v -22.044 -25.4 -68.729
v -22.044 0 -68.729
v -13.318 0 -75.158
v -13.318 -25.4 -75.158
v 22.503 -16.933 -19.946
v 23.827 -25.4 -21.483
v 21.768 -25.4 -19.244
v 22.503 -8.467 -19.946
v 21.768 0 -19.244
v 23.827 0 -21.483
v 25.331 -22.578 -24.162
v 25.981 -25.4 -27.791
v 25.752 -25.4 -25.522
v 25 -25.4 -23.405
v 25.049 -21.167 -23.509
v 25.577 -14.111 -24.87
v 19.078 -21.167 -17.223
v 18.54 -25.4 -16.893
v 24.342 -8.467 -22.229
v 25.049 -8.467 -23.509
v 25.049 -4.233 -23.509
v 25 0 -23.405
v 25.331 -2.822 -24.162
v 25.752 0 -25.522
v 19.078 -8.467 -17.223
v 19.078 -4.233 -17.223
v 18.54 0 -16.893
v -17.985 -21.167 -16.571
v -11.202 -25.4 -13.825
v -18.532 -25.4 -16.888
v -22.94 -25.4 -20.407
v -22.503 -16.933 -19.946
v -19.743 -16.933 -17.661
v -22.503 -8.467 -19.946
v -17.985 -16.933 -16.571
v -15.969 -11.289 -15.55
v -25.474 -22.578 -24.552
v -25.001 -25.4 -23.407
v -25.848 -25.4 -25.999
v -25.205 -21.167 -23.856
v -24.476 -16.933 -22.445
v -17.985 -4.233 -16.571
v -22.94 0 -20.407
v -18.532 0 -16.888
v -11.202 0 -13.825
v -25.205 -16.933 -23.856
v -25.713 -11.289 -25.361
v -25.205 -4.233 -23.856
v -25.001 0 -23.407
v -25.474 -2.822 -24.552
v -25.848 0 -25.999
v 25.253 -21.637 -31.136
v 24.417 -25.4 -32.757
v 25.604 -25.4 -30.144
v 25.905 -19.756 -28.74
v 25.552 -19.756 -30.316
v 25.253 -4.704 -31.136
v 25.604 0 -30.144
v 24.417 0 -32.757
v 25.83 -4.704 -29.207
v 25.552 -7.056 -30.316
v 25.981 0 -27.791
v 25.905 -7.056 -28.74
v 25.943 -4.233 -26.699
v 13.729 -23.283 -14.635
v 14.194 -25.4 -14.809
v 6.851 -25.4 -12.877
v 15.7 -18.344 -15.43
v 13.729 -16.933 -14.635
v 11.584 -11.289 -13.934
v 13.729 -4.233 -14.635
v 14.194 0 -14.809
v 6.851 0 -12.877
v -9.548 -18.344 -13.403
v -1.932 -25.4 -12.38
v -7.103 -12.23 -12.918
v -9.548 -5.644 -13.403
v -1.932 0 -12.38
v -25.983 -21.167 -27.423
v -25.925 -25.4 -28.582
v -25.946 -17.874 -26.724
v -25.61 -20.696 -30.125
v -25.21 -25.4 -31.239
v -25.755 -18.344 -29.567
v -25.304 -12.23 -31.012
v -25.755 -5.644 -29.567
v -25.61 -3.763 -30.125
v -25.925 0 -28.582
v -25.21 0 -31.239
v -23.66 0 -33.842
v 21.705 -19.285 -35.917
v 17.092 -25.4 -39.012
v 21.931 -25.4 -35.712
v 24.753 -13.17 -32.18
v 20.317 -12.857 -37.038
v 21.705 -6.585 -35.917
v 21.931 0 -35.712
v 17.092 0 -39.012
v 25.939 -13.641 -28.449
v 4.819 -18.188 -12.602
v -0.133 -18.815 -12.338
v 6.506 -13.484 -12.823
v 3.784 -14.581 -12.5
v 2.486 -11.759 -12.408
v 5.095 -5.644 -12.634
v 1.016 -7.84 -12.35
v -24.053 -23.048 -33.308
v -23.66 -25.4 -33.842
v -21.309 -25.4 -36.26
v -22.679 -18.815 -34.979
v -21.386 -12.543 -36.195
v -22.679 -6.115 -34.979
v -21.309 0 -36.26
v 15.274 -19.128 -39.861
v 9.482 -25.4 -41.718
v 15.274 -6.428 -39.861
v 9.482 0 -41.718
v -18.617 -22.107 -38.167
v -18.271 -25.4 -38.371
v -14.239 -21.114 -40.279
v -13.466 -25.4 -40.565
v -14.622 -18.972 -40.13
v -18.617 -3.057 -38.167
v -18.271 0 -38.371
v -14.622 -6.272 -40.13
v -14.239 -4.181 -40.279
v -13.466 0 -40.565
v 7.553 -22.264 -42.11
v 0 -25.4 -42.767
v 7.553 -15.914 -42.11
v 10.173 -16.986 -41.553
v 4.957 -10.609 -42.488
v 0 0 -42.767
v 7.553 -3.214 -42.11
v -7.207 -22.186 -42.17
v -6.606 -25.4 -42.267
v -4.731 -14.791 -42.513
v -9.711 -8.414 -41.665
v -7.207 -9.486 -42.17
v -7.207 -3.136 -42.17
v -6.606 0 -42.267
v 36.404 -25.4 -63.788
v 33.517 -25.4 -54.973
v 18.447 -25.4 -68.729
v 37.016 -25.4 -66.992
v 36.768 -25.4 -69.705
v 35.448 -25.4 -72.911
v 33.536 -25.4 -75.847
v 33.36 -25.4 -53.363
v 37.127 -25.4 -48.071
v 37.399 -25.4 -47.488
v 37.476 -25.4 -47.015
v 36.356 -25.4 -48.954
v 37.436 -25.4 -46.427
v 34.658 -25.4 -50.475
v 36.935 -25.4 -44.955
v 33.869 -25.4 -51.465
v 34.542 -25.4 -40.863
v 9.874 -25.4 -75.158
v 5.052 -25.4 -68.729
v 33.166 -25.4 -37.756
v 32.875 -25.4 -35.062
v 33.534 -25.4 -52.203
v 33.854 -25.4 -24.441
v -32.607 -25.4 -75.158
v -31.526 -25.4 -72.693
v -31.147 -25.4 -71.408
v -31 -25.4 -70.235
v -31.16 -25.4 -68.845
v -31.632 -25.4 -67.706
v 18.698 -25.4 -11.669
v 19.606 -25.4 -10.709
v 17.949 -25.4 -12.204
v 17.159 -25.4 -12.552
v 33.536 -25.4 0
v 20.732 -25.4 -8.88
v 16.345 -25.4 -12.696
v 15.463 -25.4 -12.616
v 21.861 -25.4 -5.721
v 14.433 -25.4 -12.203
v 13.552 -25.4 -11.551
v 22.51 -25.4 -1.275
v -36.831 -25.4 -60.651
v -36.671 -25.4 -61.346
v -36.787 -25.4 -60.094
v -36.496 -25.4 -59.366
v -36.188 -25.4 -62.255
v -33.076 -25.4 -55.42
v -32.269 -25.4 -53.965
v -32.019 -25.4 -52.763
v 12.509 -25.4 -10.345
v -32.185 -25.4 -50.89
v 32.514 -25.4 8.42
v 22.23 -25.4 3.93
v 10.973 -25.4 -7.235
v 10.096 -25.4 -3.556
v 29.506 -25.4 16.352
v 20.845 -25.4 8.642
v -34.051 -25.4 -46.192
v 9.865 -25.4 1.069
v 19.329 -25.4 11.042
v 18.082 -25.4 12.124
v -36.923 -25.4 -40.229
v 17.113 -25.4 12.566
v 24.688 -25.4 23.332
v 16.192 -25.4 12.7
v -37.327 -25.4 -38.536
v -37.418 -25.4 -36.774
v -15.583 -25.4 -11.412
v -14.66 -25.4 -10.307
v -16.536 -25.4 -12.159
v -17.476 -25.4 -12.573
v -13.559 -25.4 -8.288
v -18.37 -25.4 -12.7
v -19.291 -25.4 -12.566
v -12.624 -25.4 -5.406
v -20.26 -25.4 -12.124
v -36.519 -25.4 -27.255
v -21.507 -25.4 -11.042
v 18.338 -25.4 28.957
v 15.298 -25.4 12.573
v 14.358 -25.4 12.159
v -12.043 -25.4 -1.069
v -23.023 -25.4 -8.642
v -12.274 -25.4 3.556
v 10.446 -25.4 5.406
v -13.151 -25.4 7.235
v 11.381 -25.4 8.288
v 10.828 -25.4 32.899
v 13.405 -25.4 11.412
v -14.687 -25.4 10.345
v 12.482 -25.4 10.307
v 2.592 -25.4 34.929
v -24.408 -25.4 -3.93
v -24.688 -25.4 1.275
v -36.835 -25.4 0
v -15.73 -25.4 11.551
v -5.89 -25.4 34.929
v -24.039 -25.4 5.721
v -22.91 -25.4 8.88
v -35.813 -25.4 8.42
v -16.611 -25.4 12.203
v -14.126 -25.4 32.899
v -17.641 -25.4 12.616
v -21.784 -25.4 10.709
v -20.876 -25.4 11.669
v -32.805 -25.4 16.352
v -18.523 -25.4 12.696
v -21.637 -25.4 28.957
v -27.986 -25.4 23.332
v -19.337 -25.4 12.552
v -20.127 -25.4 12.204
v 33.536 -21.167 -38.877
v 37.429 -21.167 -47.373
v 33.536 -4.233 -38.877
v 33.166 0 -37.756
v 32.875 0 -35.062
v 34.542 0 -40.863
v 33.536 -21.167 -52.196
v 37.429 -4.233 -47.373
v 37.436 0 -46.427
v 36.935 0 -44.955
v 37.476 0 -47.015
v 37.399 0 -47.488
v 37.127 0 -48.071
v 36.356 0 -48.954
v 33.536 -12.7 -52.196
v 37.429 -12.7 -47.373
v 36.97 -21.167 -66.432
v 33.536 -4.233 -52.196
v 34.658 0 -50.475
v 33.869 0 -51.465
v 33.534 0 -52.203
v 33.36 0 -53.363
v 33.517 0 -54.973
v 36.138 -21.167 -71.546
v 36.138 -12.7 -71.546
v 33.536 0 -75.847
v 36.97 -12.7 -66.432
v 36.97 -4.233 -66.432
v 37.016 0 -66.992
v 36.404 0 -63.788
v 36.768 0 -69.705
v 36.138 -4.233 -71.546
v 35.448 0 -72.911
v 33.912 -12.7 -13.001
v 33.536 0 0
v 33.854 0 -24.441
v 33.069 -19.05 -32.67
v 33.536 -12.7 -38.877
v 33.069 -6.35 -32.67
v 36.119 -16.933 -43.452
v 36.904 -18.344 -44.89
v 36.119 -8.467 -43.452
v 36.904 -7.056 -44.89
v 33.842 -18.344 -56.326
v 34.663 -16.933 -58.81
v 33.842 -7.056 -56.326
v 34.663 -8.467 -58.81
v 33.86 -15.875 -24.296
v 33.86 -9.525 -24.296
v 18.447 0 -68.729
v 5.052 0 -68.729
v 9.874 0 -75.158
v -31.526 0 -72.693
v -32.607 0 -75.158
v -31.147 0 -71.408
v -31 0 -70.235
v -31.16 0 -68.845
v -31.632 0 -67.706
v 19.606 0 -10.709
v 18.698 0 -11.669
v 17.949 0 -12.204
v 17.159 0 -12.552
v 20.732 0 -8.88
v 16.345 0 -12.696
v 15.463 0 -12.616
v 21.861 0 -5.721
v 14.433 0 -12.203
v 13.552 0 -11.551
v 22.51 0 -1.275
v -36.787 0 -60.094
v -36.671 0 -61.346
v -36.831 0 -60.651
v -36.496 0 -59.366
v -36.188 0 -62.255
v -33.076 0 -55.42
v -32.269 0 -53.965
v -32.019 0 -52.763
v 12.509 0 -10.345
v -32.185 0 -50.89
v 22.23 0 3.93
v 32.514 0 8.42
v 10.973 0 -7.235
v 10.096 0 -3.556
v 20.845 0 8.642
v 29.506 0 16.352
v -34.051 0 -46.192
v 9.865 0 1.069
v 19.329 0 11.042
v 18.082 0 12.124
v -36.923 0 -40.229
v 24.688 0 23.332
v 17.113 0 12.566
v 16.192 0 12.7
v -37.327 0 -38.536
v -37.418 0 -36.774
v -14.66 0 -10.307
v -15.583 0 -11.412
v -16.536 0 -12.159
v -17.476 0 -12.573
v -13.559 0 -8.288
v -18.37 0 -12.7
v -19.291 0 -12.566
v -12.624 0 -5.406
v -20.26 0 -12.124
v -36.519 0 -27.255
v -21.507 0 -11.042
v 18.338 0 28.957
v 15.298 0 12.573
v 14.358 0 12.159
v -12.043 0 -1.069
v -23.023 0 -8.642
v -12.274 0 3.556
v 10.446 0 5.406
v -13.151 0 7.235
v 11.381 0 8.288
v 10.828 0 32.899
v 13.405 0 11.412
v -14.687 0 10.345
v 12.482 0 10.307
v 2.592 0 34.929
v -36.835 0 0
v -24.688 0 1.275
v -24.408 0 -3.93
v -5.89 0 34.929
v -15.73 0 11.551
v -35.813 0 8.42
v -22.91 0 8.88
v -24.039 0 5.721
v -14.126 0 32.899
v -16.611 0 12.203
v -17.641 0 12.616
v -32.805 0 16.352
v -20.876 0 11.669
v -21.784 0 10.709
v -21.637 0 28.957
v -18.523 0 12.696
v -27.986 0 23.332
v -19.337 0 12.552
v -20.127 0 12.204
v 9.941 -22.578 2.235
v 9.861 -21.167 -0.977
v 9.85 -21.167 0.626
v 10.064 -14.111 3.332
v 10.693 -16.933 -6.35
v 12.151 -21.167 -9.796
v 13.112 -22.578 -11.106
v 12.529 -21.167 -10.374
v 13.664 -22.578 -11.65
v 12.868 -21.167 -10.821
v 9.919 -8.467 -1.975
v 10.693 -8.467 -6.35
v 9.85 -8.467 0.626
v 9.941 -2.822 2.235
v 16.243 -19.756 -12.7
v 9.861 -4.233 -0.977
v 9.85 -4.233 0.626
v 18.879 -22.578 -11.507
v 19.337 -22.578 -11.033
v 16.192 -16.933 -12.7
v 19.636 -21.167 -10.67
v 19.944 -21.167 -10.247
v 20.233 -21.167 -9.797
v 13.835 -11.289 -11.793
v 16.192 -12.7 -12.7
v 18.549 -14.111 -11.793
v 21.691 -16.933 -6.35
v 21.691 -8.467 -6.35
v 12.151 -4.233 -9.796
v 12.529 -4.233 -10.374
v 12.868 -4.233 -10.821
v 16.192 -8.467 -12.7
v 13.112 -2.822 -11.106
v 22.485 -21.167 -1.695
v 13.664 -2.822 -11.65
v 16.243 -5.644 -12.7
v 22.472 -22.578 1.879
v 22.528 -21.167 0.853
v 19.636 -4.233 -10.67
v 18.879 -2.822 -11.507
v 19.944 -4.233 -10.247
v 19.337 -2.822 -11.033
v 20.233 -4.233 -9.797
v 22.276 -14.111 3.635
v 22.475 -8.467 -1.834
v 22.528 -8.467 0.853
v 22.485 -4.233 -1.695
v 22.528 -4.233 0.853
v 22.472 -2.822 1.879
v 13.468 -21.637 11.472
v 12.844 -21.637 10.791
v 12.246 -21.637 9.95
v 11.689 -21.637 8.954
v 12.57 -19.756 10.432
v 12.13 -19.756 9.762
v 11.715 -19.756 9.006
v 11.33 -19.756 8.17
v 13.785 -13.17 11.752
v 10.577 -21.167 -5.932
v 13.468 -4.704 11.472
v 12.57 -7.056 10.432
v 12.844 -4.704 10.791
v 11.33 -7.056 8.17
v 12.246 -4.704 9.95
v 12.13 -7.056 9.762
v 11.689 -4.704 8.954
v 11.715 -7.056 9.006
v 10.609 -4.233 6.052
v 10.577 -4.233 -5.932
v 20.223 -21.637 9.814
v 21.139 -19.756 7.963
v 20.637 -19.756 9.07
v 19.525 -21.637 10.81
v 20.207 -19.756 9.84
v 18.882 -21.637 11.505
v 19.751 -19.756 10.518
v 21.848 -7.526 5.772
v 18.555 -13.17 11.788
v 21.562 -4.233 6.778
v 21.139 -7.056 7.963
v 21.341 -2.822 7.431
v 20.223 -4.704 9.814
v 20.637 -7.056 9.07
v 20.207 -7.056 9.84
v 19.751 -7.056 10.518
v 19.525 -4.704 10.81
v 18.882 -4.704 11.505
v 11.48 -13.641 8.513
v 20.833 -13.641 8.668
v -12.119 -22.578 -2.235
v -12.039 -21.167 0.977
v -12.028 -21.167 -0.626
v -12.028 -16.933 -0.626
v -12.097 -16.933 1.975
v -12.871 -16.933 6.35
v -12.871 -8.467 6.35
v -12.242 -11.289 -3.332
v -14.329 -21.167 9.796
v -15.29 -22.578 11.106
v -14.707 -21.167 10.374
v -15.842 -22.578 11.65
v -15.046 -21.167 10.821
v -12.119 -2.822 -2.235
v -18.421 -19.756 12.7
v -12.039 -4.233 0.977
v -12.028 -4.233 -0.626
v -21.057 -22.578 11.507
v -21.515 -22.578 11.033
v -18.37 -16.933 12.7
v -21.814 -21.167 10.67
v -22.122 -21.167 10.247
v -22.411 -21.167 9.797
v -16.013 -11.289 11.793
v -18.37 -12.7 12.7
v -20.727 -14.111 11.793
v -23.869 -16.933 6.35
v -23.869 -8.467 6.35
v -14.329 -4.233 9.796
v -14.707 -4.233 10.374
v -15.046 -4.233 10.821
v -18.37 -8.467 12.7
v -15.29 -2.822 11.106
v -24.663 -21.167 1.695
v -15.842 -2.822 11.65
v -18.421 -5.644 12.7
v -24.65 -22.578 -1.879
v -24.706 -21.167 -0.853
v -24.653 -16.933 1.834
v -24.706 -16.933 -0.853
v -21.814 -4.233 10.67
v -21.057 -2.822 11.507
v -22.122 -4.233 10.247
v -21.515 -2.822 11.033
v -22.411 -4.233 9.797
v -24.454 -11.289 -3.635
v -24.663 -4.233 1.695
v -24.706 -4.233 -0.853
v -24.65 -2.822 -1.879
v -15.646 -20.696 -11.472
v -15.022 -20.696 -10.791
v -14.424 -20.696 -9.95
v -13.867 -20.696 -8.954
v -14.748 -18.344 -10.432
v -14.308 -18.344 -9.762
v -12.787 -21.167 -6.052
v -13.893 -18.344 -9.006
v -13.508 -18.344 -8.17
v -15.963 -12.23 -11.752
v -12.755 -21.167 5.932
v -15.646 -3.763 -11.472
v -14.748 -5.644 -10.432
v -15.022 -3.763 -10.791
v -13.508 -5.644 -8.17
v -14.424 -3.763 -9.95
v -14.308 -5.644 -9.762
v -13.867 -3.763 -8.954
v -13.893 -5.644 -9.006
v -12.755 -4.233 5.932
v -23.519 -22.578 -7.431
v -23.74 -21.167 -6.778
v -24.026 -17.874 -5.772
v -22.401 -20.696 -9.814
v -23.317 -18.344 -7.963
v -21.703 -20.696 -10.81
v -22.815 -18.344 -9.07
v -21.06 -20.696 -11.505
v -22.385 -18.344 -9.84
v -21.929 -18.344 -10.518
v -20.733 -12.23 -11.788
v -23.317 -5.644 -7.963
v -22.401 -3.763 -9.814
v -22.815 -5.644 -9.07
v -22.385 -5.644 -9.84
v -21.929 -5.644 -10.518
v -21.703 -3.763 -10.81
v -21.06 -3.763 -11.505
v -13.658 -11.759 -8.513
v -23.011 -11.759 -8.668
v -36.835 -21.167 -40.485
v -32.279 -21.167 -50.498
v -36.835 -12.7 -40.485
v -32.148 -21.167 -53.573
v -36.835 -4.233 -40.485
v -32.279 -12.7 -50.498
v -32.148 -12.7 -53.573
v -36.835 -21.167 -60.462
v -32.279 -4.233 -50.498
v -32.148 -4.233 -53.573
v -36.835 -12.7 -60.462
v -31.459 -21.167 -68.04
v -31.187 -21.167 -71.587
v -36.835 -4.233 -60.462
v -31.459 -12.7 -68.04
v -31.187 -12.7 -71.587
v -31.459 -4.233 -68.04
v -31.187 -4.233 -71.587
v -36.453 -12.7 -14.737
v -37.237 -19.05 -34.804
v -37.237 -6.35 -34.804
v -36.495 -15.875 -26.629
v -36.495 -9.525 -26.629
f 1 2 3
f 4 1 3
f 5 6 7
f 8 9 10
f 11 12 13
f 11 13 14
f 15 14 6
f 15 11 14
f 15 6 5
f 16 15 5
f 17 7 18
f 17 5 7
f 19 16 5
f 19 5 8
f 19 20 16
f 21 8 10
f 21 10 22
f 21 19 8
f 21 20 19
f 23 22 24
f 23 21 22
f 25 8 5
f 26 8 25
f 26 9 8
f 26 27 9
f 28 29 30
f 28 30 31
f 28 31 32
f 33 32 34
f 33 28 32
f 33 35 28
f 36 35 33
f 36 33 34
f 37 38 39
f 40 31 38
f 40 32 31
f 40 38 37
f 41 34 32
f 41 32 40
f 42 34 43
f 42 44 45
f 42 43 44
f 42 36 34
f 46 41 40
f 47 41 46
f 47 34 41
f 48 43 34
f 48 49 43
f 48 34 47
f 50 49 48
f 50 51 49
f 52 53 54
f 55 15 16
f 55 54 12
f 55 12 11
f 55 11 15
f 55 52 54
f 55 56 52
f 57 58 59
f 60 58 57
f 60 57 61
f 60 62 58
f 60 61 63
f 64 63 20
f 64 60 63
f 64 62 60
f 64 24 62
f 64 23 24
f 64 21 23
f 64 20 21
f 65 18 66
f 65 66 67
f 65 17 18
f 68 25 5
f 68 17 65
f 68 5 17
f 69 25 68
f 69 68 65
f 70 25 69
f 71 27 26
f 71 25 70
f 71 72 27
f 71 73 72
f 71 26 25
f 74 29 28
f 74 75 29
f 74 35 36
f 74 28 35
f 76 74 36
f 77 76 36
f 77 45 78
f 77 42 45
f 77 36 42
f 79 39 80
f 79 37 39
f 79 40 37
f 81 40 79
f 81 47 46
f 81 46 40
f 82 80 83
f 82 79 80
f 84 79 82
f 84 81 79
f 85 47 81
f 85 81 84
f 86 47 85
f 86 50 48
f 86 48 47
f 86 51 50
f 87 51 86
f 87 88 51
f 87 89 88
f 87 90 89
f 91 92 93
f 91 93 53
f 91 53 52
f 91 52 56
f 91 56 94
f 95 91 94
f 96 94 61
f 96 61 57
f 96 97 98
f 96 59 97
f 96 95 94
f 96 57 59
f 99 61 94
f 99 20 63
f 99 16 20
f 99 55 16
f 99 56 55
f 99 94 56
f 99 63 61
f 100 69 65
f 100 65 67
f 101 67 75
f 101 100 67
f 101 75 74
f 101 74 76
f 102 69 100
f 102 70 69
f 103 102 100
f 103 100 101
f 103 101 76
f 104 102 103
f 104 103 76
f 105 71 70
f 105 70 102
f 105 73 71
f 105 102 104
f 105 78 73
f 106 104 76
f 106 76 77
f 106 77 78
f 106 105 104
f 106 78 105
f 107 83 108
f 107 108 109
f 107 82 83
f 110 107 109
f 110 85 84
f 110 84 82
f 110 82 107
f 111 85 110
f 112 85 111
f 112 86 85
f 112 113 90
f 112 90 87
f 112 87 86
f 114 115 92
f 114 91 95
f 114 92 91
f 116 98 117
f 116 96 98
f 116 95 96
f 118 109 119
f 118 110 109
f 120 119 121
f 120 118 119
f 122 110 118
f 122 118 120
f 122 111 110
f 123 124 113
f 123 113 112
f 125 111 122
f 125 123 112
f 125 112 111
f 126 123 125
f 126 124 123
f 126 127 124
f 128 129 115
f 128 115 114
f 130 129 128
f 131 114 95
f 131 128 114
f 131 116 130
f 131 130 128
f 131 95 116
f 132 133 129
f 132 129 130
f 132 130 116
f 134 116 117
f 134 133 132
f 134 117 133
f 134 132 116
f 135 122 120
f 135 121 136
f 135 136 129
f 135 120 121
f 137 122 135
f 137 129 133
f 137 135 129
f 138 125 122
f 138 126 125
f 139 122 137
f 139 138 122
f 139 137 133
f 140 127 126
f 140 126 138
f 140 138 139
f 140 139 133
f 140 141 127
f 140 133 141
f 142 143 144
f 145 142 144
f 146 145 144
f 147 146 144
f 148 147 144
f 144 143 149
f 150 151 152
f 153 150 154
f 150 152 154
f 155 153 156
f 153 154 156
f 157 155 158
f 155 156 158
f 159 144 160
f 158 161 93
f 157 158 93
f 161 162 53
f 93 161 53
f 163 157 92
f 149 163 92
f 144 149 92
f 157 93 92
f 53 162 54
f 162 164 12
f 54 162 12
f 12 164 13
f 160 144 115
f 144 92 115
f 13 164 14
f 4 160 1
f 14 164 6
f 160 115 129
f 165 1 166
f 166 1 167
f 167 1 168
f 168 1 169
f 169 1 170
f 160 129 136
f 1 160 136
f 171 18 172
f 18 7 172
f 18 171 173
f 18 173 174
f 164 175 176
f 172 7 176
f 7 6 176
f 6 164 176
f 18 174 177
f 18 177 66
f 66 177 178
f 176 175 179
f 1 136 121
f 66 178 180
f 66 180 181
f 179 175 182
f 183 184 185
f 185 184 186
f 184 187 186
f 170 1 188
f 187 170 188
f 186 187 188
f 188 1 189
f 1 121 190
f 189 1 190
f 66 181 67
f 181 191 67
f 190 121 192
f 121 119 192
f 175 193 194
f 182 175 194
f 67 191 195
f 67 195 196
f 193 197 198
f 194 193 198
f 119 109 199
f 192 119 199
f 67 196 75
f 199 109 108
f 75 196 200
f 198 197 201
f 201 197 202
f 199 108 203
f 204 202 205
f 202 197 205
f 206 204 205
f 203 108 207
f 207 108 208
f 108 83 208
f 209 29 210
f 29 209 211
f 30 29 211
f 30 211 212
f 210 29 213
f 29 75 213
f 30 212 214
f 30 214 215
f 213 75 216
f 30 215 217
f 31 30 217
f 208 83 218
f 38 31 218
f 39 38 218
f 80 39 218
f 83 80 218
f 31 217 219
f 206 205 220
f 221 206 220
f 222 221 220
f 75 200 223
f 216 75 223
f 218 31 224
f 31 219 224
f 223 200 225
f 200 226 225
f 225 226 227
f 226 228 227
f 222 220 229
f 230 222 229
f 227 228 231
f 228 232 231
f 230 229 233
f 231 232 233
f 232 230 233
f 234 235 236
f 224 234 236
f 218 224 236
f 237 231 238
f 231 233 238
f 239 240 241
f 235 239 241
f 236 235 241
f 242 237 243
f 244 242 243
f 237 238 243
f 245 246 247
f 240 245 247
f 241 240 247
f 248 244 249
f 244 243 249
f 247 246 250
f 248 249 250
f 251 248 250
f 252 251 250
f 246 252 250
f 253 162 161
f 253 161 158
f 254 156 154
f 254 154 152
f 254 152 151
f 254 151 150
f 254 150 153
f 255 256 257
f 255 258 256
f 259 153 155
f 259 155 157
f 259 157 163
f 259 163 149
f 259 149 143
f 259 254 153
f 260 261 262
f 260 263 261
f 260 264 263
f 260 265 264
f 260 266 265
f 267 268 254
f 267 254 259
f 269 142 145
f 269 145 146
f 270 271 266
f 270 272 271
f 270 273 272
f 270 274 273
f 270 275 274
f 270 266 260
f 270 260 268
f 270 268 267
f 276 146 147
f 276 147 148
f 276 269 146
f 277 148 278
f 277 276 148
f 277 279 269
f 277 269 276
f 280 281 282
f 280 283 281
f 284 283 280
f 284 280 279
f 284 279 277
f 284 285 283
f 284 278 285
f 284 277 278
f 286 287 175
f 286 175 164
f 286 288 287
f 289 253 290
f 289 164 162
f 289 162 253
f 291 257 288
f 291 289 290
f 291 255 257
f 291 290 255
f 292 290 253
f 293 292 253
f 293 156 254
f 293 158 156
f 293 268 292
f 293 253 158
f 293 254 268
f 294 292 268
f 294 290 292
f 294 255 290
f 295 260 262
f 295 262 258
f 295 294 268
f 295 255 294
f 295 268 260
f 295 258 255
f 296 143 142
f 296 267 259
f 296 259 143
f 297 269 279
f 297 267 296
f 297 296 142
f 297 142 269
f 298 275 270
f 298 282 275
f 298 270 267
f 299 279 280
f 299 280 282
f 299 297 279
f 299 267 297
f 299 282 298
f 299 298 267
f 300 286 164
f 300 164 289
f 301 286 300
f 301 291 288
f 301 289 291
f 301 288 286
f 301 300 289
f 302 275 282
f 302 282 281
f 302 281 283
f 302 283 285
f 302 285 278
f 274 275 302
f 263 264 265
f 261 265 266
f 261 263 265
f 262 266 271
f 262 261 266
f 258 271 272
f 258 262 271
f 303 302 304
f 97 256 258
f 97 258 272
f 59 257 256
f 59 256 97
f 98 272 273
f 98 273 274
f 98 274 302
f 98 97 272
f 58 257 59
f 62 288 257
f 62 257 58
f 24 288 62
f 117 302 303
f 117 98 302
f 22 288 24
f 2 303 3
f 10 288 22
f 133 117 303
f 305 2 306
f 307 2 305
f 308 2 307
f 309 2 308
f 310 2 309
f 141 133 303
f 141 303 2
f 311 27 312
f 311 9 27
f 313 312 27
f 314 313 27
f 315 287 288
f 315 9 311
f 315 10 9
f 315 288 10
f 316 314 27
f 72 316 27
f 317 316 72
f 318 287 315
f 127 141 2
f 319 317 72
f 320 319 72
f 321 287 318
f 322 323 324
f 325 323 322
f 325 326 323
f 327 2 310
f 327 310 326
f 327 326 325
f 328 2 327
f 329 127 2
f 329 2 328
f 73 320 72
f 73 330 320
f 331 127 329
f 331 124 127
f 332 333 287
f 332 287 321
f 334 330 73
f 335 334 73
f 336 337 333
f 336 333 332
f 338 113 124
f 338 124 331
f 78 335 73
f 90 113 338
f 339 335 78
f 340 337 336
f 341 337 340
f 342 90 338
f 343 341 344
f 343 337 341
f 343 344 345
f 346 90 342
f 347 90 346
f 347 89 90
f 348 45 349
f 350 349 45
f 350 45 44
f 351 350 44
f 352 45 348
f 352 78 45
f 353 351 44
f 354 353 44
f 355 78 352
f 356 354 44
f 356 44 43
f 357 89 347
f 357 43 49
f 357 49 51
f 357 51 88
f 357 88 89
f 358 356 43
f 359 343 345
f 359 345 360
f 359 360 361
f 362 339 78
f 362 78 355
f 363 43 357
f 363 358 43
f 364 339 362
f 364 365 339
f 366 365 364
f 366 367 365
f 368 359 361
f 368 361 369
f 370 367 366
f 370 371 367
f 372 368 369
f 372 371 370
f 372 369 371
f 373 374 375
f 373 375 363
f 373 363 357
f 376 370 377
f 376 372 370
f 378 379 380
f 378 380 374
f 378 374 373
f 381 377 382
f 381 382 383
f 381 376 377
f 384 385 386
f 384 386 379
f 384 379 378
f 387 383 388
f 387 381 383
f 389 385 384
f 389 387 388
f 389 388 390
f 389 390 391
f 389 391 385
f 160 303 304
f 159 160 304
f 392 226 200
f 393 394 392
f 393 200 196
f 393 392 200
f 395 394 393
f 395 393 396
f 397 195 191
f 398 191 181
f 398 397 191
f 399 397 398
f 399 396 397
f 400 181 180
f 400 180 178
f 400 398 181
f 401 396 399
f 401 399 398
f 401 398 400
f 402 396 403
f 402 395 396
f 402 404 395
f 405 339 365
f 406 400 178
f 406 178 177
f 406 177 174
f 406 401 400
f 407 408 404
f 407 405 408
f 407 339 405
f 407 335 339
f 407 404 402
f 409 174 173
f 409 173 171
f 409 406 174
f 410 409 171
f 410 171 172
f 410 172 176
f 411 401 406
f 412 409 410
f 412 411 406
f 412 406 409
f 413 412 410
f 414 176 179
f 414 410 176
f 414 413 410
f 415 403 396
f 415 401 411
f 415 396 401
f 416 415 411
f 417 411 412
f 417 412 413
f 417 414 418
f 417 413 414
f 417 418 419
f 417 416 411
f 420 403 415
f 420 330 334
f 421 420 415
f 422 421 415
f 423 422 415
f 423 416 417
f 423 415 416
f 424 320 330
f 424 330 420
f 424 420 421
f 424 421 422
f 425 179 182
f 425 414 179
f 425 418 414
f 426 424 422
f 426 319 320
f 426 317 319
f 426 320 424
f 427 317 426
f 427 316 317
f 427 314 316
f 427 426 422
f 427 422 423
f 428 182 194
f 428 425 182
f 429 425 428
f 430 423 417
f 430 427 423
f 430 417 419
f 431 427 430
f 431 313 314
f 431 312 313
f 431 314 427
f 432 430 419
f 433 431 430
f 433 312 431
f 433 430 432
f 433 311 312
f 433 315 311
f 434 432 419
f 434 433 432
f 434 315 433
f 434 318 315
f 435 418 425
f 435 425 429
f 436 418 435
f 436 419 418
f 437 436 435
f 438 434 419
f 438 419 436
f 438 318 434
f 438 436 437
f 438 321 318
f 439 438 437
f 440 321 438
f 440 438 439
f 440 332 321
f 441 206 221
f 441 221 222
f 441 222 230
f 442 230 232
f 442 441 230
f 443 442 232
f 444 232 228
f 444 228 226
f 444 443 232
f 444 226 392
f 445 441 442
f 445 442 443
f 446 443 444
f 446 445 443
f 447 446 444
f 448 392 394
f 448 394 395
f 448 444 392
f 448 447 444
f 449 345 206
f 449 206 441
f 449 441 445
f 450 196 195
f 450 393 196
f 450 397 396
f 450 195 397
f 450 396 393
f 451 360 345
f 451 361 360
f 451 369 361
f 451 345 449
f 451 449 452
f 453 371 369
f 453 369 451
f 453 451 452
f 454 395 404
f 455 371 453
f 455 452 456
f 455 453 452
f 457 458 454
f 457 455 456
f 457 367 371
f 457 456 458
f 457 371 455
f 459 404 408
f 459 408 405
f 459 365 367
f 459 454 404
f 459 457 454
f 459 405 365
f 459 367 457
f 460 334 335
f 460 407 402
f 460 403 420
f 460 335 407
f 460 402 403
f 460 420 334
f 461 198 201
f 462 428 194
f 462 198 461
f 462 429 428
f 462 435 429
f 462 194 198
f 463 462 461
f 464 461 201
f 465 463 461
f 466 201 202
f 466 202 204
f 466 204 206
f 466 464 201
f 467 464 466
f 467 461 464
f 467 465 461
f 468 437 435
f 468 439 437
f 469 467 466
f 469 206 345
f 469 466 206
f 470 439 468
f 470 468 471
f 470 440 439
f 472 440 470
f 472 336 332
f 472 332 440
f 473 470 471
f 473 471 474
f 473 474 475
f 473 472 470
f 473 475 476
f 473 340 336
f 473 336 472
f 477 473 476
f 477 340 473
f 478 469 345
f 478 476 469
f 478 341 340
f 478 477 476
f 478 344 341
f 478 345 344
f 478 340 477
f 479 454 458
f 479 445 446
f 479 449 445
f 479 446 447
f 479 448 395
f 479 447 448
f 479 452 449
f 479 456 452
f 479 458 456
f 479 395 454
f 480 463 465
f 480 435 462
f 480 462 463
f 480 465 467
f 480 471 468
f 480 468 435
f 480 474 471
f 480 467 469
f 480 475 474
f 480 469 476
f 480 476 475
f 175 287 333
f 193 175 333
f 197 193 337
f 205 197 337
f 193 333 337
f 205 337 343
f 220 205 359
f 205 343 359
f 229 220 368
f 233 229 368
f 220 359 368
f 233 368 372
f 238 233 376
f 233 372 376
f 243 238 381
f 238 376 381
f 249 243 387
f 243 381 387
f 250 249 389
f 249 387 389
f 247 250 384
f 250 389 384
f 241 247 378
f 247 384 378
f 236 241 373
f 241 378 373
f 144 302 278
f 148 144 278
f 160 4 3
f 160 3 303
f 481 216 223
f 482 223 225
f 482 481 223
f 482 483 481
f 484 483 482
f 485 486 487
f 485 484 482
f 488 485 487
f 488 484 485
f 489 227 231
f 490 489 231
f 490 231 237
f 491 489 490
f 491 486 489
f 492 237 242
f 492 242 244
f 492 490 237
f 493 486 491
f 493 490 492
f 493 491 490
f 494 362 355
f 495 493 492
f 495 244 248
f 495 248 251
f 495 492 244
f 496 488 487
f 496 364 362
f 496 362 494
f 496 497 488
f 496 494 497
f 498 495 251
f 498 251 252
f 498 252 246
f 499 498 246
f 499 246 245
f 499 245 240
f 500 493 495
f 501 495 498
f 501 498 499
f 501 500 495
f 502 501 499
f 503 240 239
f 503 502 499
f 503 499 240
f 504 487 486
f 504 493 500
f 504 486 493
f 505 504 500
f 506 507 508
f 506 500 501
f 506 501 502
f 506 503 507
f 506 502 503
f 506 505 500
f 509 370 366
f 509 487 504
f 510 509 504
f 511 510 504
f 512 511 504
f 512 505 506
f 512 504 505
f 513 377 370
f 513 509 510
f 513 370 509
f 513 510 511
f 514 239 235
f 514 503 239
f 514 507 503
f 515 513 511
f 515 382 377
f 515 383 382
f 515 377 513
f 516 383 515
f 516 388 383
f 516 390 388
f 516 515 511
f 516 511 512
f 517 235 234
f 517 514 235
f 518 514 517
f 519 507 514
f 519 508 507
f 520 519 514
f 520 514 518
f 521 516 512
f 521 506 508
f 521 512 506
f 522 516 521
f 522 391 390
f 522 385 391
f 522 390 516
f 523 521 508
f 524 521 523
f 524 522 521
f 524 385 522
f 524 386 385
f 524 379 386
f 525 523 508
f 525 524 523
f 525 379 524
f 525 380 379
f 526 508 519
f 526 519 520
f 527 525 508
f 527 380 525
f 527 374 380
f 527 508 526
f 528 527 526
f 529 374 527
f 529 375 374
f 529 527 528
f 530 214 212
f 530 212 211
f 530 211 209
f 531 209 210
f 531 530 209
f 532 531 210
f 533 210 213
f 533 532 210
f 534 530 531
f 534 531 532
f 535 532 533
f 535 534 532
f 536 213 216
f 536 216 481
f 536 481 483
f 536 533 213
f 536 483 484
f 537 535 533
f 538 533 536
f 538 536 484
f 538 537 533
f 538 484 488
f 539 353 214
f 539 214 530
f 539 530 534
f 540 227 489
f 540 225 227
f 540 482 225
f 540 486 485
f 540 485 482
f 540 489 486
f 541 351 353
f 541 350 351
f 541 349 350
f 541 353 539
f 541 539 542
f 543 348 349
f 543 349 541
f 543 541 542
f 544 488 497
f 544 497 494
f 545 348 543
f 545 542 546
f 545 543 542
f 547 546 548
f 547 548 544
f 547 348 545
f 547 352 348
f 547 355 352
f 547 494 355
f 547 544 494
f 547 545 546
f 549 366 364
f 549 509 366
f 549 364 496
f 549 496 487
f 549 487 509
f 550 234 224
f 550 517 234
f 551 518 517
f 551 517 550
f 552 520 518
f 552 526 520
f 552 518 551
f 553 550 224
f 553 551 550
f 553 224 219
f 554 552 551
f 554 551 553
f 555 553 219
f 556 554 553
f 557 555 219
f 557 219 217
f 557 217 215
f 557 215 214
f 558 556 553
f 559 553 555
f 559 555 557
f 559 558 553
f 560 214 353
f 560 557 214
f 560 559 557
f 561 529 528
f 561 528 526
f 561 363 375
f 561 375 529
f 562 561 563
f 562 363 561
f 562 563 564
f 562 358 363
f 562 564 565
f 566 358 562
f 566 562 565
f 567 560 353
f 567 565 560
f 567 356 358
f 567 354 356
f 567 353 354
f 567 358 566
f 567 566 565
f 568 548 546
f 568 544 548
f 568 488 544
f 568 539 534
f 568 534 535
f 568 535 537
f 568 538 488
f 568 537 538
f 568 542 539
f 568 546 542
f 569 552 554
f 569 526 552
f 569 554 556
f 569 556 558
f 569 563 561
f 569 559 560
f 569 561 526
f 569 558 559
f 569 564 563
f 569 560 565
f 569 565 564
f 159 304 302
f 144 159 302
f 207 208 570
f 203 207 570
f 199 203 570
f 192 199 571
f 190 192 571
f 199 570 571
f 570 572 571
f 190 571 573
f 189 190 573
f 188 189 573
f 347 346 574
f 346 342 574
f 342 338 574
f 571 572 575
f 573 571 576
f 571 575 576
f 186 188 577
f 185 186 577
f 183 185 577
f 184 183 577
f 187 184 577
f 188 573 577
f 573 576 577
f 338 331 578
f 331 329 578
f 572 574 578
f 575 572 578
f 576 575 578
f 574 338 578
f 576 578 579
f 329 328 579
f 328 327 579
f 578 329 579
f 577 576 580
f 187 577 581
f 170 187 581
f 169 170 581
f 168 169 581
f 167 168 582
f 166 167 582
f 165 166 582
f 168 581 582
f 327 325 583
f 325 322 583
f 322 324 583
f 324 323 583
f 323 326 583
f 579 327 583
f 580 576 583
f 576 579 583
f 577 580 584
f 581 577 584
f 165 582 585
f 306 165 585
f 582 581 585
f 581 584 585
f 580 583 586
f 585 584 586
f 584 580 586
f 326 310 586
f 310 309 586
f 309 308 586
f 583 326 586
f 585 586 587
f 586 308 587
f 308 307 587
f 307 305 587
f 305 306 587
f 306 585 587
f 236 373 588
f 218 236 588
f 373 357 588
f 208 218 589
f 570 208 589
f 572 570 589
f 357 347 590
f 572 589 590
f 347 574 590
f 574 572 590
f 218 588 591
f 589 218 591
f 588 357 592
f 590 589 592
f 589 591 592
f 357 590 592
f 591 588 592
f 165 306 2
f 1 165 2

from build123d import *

# Parameters (mm, degrees)
F1_DEPTH = 25.4


with BuildPart() as f1:
    # F0 (on Front) → F1 (new body)
    with BuildSketch(Plane.XZ):
        with BuildLine():
            add(Edge.make_bspline(
                [(33.5363921551, 0), (33.9080503015, -11.007391355), (34.4965604021, -28.4372823861), (31.4981838417, -38.4265799345), (40.4885377137, -47.9763659856), (29.8994235012, -51.4539062408), (39.7338912438, -66.9346122532), (35.4677482135, -73.069574644), (33.5363921551, -75.8469772528)],
                knots=[0, 0, 0, 0, 0.2556398625, 0.4047984488, 0.54991024, 0.6680784589, 0.8497334302, 1, 1, 1, 1], degree=3))
            ThreePointArc((33.5363921551, 0), (-1.6493287325, 35.1857208876), (-36.8350496202, 0))
            add(Edge.make_bspline(
                [(-36.8350496202, 0), (-36.4587004208, -12.4492421861), (-35.8850816983, -31.4239561264), (-38.8239034904, -40.0162228604), (-27.8861063097, -54.0841505323), (-40.8604743479, -60.2496717683), (-29.0513552965, -67.6864456309), (-31.4727458652, -72.7749193903), (-32.6068031863, -75.1581040757)],
                knots=[0, 0, 0, 0, 0.269151787, 0.4102320518, 0.5883116679, 0.7261746602, 0.8717540097, 1, 1, 1, 1], degree=3))
            Line((-32.6068031863, -75.1581040757), (-22.0440358096, -68.7285931954))
            Line((-22.0440358096, -68.7285931954), (-13.3182714171, -75.1581040757))
            Line((-13.3182714171, -75.1581040757), (5.0517575526, -68.7285931954))
            Line((5.0517575526, -68.7285931954), (9.8738924562, -75.1581040757))
            Line((9.8738924562, -75.1581040757), (18.4465705306, -68.7285931954))
            Line((18.4465705306, -68.7285931954), (33.5363921551, -75.8469772528))
        make_face()
        with BuildLine():
            add(Edge.make_bspline(
                [(0, -42.7674170168), (45.005954594, -42.7674170168), (22.502977297, -19.9455170168), (0, 2.8763829832), (-22.502977297, -19.9455170168), (-45.005954594, -42.7674170168), (0, -42.7674170168)],
                knots=[4.7123889804, 4.7123889804, 4.7123889804, 6.8067840828, 6.8067840828, 8.9011791852, 8.9011791852, 10.9955742876, 10.9955742876, 10.9955742876], degree=2, weights=[1, 0.5, 1, 0.5, 1, 0.5, 1]))
        make_face(mode=Mode.SUBTRACT)
        with BuildLine():
            add(Edge.make_bspline(
                [(-18.3700298414, -12.7), (-7.3715072133, -12.7), (-12.8707685273, 6.35), (-18.3700298414, 25.4), (-23.8692911554, 6.35), (-29.3685524694, -12.7), (-18.3700298414, -12.7)],
                knots=[0, 0, 0, 2.0943951024, 2.0943951024, 4.1887902048, 4.1887902048, 6.2831853072, 6.2831853072, 6.2831853072], degree=2, weights=[1, 0.5, 1, 0.5, 1, 0.5, 1]))
        make_face(mode=Mode.SUBTRACT)
        with BuildLine():
            add(Edge.make_bspline(
                [(16.192028299, 12.7), (5.1935056709, 12.7), (10.6927669849, -6.35), (16.192028299, -25.4), (21.691289613, -6.35), (27.190550927, 12.7), (16.192028299, 12.7)],
                knots=[0, 0, 0, 2.0943951024, 2.0943951024, 4.1887902048, 4.1887902048, 6.2831853072, 6.2831853072, 6.2831853072], degree=2, weights=[1, 0.5, 1, 0.5, 1, 0.5, 1]))
        make_face(mode=Mode.SUBTRACT)
    extrude(amount=F1_DEPTH)


solid = f1.part
